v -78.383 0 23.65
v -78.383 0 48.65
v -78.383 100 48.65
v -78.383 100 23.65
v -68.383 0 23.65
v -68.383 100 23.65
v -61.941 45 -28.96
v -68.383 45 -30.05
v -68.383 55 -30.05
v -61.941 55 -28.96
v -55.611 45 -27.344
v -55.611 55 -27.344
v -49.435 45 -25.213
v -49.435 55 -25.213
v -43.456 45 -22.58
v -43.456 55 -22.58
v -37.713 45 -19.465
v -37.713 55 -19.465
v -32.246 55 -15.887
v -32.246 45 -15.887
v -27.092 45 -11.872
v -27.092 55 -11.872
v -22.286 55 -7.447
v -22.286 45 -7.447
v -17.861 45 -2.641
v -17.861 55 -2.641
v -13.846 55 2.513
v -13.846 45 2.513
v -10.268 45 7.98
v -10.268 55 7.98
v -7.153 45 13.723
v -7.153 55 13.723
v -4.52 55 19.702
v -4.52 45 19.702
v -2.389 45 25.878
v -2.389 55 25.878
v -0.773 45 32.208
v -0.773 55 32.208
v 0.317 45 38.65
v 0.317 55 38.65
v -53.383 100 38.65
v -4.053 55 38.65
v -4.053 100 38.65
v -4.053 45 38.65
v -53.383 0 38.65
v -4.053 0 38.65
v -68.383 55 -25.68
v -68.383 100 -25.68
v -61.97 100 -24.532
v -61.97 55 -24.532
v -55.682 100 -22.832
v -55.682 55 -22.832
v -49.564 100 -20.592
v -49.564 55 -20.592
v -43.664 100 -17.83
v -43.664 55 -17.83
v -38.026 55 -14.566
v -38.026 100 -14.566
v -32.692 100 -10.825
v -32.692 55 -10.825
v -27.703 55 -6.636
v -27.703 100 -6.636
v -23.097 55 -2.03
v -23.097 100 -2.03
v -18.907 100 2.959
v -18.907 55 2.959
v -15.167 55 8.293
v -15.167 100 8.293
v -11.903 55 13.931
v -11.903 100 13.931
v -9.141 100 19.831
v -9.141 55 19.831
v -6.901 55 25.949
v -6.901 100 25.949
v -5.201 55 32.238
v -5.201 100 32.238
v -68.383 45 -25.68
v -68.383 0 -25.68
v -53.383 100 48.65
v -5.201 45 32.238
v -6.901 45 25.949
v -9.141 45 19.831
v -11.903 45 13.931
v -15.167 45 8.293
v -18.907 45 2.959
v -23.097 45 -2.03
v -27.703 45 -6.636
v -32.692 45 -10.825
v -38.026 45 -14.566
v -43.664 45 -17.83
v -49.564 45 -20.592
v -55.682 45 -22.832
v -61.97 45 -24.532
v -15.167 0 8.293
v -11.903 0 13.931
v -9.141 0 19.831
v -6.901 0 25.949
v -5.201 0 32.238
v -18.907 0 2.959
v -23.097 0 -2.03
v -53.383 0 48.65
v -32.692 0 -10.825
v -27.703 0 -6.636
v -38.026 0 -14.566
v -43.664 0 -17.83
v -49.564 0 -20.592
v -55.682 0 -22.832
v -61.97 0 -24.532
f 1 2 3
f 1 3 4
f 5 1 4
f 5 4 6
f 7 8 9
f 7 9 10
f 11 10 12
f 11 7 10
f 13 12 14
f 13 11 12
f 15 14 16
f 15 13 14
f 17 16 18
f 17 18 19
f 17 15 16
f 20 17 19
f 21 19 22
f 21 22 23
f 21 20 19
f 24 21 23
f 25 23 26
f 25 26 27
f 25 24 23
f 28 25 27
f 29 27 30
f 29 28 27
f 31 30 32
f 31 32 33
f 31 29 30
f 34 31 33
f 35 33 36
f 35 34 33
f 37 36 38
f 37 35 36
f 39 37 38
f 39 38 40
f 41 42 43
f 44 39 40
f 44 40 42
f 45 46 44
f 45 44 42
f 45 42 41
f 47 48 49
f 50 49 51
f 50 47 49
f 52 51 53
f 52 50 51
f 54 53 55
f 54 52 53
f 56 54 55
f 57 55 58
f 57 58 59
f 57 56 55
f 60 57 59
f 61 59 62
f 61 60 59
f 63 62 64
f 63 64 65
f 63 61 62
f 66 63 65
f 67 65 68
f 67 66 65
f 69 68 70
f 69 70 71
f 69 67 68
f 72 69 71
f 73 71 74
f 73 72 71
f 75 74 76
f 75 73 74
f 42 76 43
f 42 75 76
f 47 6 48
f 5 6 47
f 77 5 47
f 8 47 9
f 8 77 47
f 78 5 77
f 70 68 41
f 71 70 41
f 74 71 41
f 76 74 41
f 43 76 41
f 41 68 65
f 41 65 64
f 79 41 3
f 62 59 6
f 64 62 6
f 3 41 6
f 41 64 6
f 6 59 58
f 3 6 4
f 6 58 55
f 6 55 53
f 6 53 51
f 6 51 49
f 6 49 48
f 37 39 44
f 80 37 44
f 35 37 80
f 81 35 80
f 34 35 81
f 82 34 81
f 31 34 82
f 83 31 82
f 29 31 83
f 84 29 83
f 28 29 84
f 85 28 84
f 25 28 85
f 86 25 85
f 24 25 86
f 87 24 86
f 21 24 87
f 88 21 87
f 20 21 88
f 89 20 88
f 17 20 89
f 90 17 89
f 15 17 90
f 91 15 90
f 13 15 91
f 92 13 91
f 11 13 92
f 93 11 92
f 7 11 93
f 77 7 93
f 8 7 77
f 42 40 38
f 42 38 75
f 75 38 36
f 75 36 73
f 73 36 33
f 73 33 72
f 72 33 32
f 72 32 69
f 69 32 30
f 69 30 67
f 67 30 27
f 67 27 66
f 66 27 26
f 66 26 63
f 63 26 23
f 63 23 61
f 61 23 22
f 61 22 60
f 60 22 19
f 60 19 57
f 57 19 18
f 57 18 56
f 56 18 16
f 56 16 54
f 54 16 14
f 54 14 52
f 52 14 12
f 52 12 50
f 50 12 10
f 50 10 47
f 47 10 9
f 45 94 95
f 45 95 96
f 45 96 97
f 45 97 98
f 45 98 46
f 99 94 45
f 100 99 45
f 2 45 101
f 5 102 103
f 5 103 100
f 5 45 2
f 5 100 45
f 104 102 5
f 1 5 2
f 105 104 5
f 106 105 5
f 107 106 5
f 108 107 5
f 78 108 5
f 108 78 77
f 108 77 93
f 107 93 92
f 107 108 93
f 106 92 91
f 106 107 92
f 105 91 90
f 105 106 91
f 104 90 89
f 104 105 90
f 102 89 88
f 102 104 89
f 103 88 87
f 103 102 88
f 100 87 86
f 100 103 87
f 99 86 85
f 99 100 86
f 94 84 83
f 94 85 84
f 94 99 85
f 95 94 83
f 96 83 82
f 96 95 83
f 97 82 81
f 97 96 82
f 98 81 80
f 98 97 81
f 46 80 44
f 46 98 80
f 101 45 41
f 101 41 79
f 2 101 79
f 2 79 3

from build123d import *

# Parameters (mm, degrees)
BOSS_EXTRUDE1_DEPTH = 100
BOSS_EXTRUDE2_DEPTH = 5


with BuildPart() as part:
    # Sketch2 → Boss-Extrude1 (new body)
    with BuildSketch(Plane(origin=(0, 0, 0), x_dir=(1, 0, 0), z_dir=(0, 1, 0))):
        with BuildLine():
            Line((-78.383022578, -48.650161377), (-78.383022578, -23.650161377))
            Line((-78.383022578, -23.650161377), (-68.383022578, -23.650161377))
            Line((-68.383022578, -23.650161377), (-68.383022578, 25.68018236))
            ThreePointArc((-68.383022578, 25.68018236), (-25.350013989, 4.382847212), (-4.052678842, -38.650161377))
            Line((-4.052678842, -38.650161377), (-53.383022578, -38.650161377))
            Line((-53.383022578, -38.650161377), (-53.383022578, -48.650161377))
            Line((-53.383022578, -48.650161377), (-78.383022578, -48.650161377))
        make_face()
    extrude(amount=BOSS_EXTRUDE1_DEPTH)

    # Sketch3 → Boss-Extrude2 (add, symmetric)
    with BuildSketch(Plane(origin=(0, 50, 0), x_dir=(-1, 0, 0), z_dir=(0, -1, 0))):
        with BuildLine():
            Line((68.383022578, 25.68018236), (68.383022578, 30.04988769))
            ThreePointArc((68.383022578, 30.04988769), (22.286241373, 7.446619828), (-0.317026488, -38.650161377))
            Line((-0.317026488, -38.650161377), (4.052678842, -38.650161377))
            ThreePointArc((4.052678842, -38.650161377), (25.350013989, 4.382847212), (68.383022578, 25.68018236))
        make_face()
    extrude(amount=BOSS_EXTRUDE2_DEPTH, both=True)


solid = part.part
